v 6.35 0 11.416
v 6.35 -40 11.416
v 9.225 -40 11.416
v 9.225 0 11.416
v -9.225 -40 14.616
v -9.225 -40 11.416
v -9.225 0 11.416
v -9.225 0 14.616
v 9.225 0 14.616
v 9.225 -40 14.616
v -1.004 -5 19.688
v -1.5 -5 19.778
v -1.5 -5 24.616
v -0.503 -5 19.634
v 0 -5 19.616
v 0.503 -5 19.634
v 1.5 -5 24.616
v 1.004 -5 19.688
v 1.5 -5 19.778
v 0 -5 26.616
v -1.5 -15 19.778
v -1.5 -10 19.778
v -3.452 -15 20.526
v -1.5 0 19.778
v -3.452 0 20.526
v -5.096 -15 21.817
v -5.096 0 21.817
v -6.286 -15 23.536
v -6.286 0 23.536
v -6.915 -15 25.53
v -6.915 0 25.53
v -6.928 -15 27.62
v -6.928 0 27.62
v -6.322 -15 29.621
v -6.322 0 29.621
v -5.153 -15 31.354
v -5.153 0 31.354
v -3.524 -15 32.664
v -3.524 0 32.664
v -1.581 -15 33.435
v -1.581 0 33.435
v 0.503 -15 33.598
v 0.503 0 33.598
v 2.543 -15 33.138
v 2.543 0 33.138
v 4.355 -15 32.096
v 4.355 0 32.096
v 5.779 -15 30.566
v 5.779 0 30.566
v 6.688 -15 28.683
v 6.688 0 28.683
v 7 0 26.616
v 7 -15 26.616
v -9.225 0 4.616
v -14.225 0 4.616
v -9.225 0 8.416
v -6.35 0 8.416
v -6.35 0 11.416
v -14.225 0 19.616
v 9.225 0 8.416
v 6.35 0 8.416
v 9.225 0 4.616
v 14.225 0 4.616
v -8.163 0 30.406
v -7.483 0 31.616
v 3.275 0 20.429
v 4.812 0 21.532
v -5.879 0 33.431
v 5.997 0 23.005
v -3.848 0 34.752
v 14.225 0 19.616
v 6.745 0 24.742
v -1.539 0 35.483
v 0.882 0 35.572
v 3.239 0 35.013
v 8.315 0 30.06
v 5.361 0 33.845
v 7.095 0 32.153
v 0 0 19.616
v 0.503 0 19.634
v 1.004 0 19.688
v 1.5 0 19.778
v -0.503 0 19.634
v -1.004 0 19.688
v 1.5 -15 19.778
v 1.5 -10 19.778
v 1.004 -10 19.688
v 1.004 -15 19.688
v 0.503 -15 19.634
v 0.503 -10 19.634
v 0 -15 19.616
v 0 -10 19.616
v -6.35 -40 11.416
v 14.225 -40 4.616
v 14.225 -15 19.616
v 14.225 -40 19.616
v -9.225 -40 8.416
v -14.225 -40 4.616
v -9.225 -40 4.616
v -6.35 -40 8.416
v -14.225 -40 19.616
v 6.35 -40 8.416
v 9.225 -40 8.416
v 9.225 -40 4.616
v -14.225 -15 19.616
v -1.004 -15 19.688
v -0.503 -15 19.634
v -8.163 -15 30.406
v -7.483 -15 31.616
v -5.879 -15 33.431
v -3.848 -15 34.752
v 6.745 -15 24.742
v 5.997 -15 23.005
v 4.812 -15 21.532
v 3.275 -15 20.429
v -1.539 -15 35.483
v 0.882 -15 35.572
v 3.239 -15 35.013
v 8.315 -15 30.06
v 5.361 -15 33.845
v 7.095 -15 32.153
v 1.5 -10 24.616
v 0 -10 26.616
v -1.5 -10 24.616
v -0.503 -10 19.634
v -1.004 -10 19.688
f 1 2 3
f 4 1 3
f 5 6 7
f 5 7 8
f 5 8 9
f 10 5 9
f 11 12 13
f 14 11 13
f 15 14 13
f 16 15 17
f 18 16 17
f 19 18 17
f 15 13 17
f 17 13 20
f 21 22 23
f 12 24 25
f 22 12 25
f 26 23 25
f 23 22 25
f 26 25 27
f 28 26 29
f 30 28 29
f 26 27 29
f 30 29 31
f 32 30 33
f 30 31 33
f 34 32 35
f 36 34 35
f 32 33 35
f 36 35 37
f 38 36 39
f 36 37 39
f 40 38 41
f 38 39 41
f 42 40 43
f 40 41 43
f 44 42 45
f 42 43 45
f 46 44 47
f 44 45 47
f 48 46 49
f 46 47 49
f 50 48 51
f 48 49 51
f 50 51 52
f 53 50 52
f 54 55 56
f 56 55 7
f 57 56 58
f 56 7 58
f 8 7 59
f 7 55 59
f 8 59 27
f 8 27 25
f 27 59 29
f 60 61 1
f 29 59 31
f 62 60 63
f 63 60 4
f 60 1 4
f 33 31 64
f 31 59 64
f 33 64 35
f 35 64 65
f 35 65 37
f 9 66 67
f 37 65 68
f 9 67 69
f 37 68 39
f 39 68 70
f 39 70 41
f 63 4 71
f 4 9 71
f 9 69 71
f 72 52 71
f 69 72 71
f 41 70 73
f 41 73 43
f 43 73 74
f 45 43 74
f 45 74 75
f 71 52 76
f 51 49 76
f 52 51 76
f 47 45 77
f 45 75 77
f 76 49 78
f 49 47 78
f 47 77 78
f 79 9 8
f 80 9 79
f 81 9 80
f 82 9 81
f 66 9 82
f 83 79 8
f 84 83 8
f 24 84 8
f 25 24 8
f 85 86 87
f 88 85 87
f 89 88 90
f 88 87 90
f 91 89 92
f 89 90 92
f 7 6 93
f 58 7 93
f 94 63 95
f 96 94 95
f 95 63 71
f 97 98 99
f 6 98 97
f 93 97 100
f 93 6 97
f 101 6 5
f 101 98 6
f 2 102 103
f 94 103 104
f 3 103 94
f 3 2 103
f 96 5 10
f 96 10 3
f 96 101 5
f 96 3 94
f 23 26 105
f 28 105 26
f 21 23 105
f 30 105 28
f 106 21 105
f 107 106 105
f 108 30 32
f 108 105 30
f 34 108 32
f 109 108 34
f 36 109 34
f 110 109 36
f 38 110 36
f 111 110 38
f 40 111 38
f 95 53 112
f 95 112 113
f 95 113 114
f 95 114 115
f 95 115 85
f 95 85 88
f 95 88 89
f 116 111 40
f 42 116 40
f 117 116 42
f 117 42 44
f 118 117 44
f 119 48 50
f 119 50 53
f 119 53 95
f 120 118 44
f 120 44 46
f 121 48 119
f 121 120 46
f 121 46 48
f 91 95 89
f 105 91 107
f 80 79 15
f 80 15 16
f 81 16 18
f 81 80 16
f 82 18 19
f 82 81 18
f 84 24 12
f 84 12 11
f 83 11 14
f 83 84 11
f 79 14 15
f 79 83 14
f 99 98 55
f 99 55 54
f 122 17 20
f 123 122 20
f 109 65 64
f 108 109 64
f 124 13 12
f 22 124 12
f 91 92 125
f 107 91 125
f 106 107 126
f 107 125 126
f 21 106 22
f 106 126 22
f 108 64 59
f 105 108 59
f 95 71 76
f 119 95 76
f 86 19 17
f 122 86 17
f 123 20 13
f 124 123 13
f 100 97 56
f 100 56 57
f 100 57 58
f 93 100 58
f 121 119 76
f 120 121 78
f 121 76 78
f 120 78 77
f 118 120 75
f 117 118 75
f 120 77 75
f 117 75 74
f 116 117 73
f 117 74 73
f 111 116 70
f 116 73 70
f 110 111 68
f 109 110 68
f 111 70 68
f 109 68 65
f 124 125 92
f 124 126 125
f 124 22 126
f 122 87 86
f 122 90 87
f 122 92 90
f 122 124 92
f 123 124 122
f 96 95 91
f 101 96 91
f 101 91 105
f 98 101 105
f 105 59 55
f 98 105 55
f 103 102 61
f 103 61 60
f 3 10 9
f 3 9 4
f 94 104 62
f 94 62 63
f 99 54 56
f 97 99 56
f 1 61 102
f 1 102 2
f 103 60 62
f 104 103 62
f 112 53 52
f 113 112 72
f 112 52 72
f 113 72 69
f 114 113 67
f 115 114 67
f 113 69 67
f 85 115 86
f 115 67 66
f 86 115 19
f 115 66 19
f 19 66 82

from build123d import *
from build123d import SkipClean  # not in build123d's __all__

# Parameters (mm, degrees)
F0_W     = 2.875
F0_H     = 3
F1_DEPTH = 40
F2_DEPTH = 15
F3_DEPTH = 10
F4_DEPTH = 15
F5_DEPTH = 5


with BuildPart() as f1:
    # F0 (on Front) → F1 (new body)
    with BuildSketch(Plane.XZ):
        Polygon((-9.225, 4.615817529), (-9.225, 8.415817529), (-9.225, 11.415817529), (-9.225, 14.615817529), (9.225, 14.615817529), (9.225, 11.415817529), (9.225, 8.415817529), (9.225, 4.615817529), (14.225, 4.615817529), (14.225, 19.615817529), (5.6568542495, 19.615817529), (1.5, 19.615817529), (0, 19.615817529), (-1.5, 19.615817529), (-5.6568542495, 19.615817529), (-14.225, 19.615817529), (-14.225, 4.615817529), align=None)
        with Locations((-7.7875, 9.915817529)):
            Rectangle(F0_W, F0_H)
        with Locations((7.7875, 9.915817529)):
            Rectangle(F0_W, F0_H)
    extrude(amount=F1_DEPTH)

    # F0 (on Front) → F2 (join)
    with BuildSketch(Plane.XZ):
        with BuildLine():
            Line((-8.1629870472, 30.4060210151), (-14.225, 19.615817529))
            Line((-14.225, 19.615817529), (-5.6568542495, 19.615817529))
            ThreePointArc((-5.6568542495, 19.615817529), (-8.766648515, 24.5796756343), (-8.1629870472, 30.4060210151))
        make_face()
        with BuildLine():
            ThreePointArc((-8.1629870472, 30.4060210151), (-8.766648515, 24.5796756343), (-5.6568542495, 19.615817529))
            Line((-5.6568542495, 19.615817529), (-1.5, 19.615817529))
            Line((-1.5, 19.615817529), (-1.5, 19.7784203634))
            ThreePointArc((-1.5, 19.7784203634), (-4.3874821937, 32.0701735863), (7, 26.615817529))
            ThreePointArc((7, 26.615817529), (5.4543560573, 22.2283353353), (1.5, 19.7784203634))
            Line((1.5, 19.7784203634), (1.5, 19.615817529))
            Line((1.5, 19.615817529), (5.6568542495, 19.615817529))
            ThreePointArc((5.6568542495, 19.615817529), (8.7219157357, 24.3958657503), (8.3150665238, 30.0596045005))
            ThreePointArc((8.3150665238, 30.0596045005), (0.8822712117, 35.5724685498), (-7.4833147735, 31.615817529))
            Line((-7.4833147735, 31.615817529), (-8.1629870472, 30.4060210151))
        make_face()
        with BuildLine():
            Line((5.6568542495, 19.615817529), (14.225, 19.615817529))
            Line((14.225, 19.615817529), (8.3150665238, 30.0596045005))
            ThreePointArc((8.3150665238, 30.0596045005), (8.7219157357, 24.3958657503), (5.6568542495, 19.615817529))
        make_face()
    extrude(amount=F2_DEPTH)

    # F0 (on Front) → F3 (join)
    with BuildSketch(Plane.XZ):
        with BuildLine():
            ThreePointArc((-1.5, 19.7784203634), (-0.7543937436, 19.6565869623), (0, 19.615817529))
            ThreePointArc((0, 19.615817529), (0.7543937436, 19.6565869623), (1.5, 19.7784203634))
            Line((1.5, 19.7784203634), (1.5, 24.615817529))
            Line((1.5, 24.615817529), (0, 26.615817529))
            Line((0, 26.615817529), (-1.5, 24.615817529))
            Line((-1.5, 24.615817529), (-1.5, 19.7784203634))
        make_face()
        with BuildLine():
            Line((-1.5, 19.7784203634), (-1.5, 19.615817529))
            Line((-1.5, 19.615817529), (0, 19.615817529))
            ThreePointArc((0, 19.615817529), (-0.7543937436, 19.6565869623), (-1.5, 19.7784203634))
        make_face()
        with BuildLine():
            Line((0, 19.615817529), (1.5, 19.615817529))
            Line((1.5, 19.615817529), (1.5, 19.7784203634))
            ThreePointArc((1.5, 19.7784203634), (0.7543937436, 19.6565869623), (0, 19.615817529))
        make_face()
    extrude(amount=F3_DEPTH)

    # F0 (on Front) → F4 (join)
    with BuildSketch(Plane.XZ):
        with BuildLine():
            Line((0, 19.615817529), (1.5, 19.615817529))
            Line((1.5, 19.615817529), (1.5, 19.7784203634))
            ThreePointArc((1.5, 19.7784203634), (0.7543937436, 19.6565869623), (0, 19.615817529))
        make_face()
        with BuildLine():
            Line((-1.5, 19.7784203634), (-1.5, 19.615817529))
            Line((-1.5, 19.615817529), (0, 19.615817529))
            ThreePointArc((0, 19.615817529), (-0.7543937436, 19.6565869623), (-1.5, 19.7784203634))
        make_face()
    extrude(amount=F4_DEPTH)

    # F0 (on Front) → F5 (cut)
    with BuildSketch(Plane.XZ):
        with BuildLine():
            ThreePointArc((-1.5, 19.7784203634), (-0.7543937436, 19.6565869623), (0, 19.615817529))
            ThreePointArc((0, 19.615817529), (0.7543937436, 19.6565869623), (1.5, 19.7784203634))
            Line((1.5, 19.7784203634), (1.5, 24.615817529))
            Line((1.5, 24.615817529), (0, 26.615817529))
            Line((0, 26.615817529), (-1.5, 24.615817529))
            Line((-1.5, 24.615817529), (-1.5, 19.7784203634))
        make_face()
    with SkipClean():  # cleaning this boolean's faces spoils the solid; the shape is the same uncleaned
        extrude(amount=F5_DEPTH, mode=Mode.SUBTRACT)


solid = f1.part
